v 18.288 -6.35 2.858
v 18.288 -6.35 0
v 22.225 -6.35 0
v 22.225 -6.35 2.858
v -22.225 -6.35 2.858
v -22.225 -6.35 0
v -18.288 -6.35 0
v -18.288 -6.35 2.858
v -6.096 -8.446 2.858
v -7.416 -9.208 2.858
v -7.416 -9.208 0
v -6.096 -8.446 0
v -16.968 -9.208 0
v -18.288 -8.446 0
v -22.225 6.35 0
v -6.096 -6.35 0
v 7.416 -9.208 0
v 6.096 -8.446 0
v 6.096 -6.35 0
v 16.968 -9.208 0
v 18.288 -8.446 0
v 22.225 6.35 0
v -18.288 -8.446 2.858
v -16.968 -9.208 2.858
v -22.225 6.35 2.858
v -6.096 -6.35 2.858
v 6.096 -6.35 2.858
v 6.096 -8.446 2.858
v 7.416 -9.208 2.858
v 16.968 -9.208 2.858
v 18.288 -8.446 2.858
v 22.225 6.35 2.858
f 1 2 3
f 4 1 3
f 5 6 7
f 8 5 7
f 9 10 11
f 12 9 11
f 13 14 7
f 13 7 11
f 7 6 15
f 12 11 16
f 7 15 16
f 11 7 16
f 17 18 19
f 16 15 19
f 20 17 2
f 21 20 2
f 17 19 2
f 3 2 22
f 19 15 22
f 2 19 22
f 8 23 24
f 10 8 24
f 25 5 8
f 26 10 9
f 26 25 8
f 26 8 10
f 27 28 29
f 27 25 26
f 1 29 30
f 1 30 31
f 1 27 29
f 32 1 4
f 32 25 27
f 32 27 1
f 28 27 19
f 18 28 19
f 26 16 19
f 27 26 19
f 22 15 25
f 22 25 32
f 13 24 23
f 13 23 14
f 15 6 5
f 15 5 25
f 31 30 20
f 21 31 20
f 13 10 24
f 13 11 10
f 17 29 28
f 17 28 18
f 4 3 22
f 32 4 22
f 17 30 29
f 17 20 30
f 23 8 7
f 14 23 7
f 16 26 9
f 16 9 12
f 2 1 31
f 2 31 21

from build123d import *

# Parameters (mm, degrees)
SKETCH1_W             = 44.45
SKETCH1_H             = 12.7
BOSS_EXTRUDE1_DEPTH   = 2.8575
SKETCH2_W             = 12.192
SKETCH2_H             = 2.8575
BOSS_EXTRUDE2_DEPTH   = 2.8575
CHAMFER1_SIZE         = 0.762
CHAMFER1_SIZE2        = 1.319822715
CHAMFER1_PART_2_SIZE  = 0.762
CHAMFER1_PART_2_SIZE2 = 1.319822715
CHAMFER2_SIZE         = 0.762
CHAMFER2_SIZE2        = 1.319822715
CHAMFER2_PART_2_SIZE  = 0.762
CHAMFER2_PART_2_SIZE2 = 1.319822715


with BuildPart() as part:
    # Sketch1 → Boss-Extrude1 (new body)
    with BuildSketch(Plane.XY):
        Rectangle(SKETCH1_W, SKETCH1_H)
    extrude(amount=BOSS_EXTRUDE1_DEPTH)

    # Sketch2 → Boss-Extrude2 (add)
    with BuildSketch(Plane(origin=(0, -6.35, 0), x_dir=(-1, 0, 0), z_dir=(0, -1, 0))):
        with Locations((12.192, -1.42875)):
            Rectangle(SKETCH2_W, SKETCH2_H)
        with Locations((-12.192, -1.42875)):
            Rectangle(SKETCH2_W, SKETCH2_H)
    extrude(amount=BOSS_EXTRUDE2_DEPTH)

    # Chamfer1
    chamfer1_edges = [part.edges().sort_by_distance(p)[0] for p in [
        (-18.288, -9.2075, 1.42875),
    ]]
    chamfer1_side = [part.faces().sort_by_distance(p)[0] for p in [
        (-18.288, -7.77875, 1.42875),
    ]]
    chamfer(chamfer1_edges, length=CHAMFER1_SIZE, length2=CHAMFER1_SIZE2, reference=chamfer1_side[0])

    # Chamfer1 part 2
    chamfer1_part_2_edges = [part.edges().sort_by_distance(p)[0] for p in [
        (6.096, -9.2075, 1.42875),
    ]]
    chamfer1_part_2_side = [part.faces().sort_by_distance(p)[0] for p in [
        (6.096, -7.77875, 1.42875),
    ]]
    chamfer(chamfer1_part_2_edges, length=CHAMFER1_PART_2_SIZE, length2=CHAMFER1_PART_2_SIZE2, reference=chamfer1_part_2_side[0])

    # Chamfer2
    chamfer2_edges = [part.edges().sort_by_distance(p)[0] for p in [
        (-6.096, -9.2075, 1.42875),
    ]]
    chamfer2_side = [part.faces().sort_by_distance(p)[0] for p in [
        (-6.096, -7.77875, 1.42875),
    ]]
    chamfer(chamfer2_edges, length=CHAMFER2_SIZE, length2=CHAMFER2_SIZE2, reference=chamfer2_side[0])

    # Chamfer2 part 2
    chamfer2_part_2_edges = [part.edges().sort_by_distance(p)[0] for p in [
        (18.288, -9.2075, 1.42875),
    ]]
    chamfer2_part_2_side = [part.faces().sort_by_distance(p)[0] for p in [
        (18.288, -7.77875, 1.42875),
    ]]
    chamfer(chamfer2_part_2_edges, length=CHAMFER2_PART_2_SIZE, length2=CHAMFER2_PART_2_SIZE2, reference=chamfer2_part_2_side[0])


solid = part.part
